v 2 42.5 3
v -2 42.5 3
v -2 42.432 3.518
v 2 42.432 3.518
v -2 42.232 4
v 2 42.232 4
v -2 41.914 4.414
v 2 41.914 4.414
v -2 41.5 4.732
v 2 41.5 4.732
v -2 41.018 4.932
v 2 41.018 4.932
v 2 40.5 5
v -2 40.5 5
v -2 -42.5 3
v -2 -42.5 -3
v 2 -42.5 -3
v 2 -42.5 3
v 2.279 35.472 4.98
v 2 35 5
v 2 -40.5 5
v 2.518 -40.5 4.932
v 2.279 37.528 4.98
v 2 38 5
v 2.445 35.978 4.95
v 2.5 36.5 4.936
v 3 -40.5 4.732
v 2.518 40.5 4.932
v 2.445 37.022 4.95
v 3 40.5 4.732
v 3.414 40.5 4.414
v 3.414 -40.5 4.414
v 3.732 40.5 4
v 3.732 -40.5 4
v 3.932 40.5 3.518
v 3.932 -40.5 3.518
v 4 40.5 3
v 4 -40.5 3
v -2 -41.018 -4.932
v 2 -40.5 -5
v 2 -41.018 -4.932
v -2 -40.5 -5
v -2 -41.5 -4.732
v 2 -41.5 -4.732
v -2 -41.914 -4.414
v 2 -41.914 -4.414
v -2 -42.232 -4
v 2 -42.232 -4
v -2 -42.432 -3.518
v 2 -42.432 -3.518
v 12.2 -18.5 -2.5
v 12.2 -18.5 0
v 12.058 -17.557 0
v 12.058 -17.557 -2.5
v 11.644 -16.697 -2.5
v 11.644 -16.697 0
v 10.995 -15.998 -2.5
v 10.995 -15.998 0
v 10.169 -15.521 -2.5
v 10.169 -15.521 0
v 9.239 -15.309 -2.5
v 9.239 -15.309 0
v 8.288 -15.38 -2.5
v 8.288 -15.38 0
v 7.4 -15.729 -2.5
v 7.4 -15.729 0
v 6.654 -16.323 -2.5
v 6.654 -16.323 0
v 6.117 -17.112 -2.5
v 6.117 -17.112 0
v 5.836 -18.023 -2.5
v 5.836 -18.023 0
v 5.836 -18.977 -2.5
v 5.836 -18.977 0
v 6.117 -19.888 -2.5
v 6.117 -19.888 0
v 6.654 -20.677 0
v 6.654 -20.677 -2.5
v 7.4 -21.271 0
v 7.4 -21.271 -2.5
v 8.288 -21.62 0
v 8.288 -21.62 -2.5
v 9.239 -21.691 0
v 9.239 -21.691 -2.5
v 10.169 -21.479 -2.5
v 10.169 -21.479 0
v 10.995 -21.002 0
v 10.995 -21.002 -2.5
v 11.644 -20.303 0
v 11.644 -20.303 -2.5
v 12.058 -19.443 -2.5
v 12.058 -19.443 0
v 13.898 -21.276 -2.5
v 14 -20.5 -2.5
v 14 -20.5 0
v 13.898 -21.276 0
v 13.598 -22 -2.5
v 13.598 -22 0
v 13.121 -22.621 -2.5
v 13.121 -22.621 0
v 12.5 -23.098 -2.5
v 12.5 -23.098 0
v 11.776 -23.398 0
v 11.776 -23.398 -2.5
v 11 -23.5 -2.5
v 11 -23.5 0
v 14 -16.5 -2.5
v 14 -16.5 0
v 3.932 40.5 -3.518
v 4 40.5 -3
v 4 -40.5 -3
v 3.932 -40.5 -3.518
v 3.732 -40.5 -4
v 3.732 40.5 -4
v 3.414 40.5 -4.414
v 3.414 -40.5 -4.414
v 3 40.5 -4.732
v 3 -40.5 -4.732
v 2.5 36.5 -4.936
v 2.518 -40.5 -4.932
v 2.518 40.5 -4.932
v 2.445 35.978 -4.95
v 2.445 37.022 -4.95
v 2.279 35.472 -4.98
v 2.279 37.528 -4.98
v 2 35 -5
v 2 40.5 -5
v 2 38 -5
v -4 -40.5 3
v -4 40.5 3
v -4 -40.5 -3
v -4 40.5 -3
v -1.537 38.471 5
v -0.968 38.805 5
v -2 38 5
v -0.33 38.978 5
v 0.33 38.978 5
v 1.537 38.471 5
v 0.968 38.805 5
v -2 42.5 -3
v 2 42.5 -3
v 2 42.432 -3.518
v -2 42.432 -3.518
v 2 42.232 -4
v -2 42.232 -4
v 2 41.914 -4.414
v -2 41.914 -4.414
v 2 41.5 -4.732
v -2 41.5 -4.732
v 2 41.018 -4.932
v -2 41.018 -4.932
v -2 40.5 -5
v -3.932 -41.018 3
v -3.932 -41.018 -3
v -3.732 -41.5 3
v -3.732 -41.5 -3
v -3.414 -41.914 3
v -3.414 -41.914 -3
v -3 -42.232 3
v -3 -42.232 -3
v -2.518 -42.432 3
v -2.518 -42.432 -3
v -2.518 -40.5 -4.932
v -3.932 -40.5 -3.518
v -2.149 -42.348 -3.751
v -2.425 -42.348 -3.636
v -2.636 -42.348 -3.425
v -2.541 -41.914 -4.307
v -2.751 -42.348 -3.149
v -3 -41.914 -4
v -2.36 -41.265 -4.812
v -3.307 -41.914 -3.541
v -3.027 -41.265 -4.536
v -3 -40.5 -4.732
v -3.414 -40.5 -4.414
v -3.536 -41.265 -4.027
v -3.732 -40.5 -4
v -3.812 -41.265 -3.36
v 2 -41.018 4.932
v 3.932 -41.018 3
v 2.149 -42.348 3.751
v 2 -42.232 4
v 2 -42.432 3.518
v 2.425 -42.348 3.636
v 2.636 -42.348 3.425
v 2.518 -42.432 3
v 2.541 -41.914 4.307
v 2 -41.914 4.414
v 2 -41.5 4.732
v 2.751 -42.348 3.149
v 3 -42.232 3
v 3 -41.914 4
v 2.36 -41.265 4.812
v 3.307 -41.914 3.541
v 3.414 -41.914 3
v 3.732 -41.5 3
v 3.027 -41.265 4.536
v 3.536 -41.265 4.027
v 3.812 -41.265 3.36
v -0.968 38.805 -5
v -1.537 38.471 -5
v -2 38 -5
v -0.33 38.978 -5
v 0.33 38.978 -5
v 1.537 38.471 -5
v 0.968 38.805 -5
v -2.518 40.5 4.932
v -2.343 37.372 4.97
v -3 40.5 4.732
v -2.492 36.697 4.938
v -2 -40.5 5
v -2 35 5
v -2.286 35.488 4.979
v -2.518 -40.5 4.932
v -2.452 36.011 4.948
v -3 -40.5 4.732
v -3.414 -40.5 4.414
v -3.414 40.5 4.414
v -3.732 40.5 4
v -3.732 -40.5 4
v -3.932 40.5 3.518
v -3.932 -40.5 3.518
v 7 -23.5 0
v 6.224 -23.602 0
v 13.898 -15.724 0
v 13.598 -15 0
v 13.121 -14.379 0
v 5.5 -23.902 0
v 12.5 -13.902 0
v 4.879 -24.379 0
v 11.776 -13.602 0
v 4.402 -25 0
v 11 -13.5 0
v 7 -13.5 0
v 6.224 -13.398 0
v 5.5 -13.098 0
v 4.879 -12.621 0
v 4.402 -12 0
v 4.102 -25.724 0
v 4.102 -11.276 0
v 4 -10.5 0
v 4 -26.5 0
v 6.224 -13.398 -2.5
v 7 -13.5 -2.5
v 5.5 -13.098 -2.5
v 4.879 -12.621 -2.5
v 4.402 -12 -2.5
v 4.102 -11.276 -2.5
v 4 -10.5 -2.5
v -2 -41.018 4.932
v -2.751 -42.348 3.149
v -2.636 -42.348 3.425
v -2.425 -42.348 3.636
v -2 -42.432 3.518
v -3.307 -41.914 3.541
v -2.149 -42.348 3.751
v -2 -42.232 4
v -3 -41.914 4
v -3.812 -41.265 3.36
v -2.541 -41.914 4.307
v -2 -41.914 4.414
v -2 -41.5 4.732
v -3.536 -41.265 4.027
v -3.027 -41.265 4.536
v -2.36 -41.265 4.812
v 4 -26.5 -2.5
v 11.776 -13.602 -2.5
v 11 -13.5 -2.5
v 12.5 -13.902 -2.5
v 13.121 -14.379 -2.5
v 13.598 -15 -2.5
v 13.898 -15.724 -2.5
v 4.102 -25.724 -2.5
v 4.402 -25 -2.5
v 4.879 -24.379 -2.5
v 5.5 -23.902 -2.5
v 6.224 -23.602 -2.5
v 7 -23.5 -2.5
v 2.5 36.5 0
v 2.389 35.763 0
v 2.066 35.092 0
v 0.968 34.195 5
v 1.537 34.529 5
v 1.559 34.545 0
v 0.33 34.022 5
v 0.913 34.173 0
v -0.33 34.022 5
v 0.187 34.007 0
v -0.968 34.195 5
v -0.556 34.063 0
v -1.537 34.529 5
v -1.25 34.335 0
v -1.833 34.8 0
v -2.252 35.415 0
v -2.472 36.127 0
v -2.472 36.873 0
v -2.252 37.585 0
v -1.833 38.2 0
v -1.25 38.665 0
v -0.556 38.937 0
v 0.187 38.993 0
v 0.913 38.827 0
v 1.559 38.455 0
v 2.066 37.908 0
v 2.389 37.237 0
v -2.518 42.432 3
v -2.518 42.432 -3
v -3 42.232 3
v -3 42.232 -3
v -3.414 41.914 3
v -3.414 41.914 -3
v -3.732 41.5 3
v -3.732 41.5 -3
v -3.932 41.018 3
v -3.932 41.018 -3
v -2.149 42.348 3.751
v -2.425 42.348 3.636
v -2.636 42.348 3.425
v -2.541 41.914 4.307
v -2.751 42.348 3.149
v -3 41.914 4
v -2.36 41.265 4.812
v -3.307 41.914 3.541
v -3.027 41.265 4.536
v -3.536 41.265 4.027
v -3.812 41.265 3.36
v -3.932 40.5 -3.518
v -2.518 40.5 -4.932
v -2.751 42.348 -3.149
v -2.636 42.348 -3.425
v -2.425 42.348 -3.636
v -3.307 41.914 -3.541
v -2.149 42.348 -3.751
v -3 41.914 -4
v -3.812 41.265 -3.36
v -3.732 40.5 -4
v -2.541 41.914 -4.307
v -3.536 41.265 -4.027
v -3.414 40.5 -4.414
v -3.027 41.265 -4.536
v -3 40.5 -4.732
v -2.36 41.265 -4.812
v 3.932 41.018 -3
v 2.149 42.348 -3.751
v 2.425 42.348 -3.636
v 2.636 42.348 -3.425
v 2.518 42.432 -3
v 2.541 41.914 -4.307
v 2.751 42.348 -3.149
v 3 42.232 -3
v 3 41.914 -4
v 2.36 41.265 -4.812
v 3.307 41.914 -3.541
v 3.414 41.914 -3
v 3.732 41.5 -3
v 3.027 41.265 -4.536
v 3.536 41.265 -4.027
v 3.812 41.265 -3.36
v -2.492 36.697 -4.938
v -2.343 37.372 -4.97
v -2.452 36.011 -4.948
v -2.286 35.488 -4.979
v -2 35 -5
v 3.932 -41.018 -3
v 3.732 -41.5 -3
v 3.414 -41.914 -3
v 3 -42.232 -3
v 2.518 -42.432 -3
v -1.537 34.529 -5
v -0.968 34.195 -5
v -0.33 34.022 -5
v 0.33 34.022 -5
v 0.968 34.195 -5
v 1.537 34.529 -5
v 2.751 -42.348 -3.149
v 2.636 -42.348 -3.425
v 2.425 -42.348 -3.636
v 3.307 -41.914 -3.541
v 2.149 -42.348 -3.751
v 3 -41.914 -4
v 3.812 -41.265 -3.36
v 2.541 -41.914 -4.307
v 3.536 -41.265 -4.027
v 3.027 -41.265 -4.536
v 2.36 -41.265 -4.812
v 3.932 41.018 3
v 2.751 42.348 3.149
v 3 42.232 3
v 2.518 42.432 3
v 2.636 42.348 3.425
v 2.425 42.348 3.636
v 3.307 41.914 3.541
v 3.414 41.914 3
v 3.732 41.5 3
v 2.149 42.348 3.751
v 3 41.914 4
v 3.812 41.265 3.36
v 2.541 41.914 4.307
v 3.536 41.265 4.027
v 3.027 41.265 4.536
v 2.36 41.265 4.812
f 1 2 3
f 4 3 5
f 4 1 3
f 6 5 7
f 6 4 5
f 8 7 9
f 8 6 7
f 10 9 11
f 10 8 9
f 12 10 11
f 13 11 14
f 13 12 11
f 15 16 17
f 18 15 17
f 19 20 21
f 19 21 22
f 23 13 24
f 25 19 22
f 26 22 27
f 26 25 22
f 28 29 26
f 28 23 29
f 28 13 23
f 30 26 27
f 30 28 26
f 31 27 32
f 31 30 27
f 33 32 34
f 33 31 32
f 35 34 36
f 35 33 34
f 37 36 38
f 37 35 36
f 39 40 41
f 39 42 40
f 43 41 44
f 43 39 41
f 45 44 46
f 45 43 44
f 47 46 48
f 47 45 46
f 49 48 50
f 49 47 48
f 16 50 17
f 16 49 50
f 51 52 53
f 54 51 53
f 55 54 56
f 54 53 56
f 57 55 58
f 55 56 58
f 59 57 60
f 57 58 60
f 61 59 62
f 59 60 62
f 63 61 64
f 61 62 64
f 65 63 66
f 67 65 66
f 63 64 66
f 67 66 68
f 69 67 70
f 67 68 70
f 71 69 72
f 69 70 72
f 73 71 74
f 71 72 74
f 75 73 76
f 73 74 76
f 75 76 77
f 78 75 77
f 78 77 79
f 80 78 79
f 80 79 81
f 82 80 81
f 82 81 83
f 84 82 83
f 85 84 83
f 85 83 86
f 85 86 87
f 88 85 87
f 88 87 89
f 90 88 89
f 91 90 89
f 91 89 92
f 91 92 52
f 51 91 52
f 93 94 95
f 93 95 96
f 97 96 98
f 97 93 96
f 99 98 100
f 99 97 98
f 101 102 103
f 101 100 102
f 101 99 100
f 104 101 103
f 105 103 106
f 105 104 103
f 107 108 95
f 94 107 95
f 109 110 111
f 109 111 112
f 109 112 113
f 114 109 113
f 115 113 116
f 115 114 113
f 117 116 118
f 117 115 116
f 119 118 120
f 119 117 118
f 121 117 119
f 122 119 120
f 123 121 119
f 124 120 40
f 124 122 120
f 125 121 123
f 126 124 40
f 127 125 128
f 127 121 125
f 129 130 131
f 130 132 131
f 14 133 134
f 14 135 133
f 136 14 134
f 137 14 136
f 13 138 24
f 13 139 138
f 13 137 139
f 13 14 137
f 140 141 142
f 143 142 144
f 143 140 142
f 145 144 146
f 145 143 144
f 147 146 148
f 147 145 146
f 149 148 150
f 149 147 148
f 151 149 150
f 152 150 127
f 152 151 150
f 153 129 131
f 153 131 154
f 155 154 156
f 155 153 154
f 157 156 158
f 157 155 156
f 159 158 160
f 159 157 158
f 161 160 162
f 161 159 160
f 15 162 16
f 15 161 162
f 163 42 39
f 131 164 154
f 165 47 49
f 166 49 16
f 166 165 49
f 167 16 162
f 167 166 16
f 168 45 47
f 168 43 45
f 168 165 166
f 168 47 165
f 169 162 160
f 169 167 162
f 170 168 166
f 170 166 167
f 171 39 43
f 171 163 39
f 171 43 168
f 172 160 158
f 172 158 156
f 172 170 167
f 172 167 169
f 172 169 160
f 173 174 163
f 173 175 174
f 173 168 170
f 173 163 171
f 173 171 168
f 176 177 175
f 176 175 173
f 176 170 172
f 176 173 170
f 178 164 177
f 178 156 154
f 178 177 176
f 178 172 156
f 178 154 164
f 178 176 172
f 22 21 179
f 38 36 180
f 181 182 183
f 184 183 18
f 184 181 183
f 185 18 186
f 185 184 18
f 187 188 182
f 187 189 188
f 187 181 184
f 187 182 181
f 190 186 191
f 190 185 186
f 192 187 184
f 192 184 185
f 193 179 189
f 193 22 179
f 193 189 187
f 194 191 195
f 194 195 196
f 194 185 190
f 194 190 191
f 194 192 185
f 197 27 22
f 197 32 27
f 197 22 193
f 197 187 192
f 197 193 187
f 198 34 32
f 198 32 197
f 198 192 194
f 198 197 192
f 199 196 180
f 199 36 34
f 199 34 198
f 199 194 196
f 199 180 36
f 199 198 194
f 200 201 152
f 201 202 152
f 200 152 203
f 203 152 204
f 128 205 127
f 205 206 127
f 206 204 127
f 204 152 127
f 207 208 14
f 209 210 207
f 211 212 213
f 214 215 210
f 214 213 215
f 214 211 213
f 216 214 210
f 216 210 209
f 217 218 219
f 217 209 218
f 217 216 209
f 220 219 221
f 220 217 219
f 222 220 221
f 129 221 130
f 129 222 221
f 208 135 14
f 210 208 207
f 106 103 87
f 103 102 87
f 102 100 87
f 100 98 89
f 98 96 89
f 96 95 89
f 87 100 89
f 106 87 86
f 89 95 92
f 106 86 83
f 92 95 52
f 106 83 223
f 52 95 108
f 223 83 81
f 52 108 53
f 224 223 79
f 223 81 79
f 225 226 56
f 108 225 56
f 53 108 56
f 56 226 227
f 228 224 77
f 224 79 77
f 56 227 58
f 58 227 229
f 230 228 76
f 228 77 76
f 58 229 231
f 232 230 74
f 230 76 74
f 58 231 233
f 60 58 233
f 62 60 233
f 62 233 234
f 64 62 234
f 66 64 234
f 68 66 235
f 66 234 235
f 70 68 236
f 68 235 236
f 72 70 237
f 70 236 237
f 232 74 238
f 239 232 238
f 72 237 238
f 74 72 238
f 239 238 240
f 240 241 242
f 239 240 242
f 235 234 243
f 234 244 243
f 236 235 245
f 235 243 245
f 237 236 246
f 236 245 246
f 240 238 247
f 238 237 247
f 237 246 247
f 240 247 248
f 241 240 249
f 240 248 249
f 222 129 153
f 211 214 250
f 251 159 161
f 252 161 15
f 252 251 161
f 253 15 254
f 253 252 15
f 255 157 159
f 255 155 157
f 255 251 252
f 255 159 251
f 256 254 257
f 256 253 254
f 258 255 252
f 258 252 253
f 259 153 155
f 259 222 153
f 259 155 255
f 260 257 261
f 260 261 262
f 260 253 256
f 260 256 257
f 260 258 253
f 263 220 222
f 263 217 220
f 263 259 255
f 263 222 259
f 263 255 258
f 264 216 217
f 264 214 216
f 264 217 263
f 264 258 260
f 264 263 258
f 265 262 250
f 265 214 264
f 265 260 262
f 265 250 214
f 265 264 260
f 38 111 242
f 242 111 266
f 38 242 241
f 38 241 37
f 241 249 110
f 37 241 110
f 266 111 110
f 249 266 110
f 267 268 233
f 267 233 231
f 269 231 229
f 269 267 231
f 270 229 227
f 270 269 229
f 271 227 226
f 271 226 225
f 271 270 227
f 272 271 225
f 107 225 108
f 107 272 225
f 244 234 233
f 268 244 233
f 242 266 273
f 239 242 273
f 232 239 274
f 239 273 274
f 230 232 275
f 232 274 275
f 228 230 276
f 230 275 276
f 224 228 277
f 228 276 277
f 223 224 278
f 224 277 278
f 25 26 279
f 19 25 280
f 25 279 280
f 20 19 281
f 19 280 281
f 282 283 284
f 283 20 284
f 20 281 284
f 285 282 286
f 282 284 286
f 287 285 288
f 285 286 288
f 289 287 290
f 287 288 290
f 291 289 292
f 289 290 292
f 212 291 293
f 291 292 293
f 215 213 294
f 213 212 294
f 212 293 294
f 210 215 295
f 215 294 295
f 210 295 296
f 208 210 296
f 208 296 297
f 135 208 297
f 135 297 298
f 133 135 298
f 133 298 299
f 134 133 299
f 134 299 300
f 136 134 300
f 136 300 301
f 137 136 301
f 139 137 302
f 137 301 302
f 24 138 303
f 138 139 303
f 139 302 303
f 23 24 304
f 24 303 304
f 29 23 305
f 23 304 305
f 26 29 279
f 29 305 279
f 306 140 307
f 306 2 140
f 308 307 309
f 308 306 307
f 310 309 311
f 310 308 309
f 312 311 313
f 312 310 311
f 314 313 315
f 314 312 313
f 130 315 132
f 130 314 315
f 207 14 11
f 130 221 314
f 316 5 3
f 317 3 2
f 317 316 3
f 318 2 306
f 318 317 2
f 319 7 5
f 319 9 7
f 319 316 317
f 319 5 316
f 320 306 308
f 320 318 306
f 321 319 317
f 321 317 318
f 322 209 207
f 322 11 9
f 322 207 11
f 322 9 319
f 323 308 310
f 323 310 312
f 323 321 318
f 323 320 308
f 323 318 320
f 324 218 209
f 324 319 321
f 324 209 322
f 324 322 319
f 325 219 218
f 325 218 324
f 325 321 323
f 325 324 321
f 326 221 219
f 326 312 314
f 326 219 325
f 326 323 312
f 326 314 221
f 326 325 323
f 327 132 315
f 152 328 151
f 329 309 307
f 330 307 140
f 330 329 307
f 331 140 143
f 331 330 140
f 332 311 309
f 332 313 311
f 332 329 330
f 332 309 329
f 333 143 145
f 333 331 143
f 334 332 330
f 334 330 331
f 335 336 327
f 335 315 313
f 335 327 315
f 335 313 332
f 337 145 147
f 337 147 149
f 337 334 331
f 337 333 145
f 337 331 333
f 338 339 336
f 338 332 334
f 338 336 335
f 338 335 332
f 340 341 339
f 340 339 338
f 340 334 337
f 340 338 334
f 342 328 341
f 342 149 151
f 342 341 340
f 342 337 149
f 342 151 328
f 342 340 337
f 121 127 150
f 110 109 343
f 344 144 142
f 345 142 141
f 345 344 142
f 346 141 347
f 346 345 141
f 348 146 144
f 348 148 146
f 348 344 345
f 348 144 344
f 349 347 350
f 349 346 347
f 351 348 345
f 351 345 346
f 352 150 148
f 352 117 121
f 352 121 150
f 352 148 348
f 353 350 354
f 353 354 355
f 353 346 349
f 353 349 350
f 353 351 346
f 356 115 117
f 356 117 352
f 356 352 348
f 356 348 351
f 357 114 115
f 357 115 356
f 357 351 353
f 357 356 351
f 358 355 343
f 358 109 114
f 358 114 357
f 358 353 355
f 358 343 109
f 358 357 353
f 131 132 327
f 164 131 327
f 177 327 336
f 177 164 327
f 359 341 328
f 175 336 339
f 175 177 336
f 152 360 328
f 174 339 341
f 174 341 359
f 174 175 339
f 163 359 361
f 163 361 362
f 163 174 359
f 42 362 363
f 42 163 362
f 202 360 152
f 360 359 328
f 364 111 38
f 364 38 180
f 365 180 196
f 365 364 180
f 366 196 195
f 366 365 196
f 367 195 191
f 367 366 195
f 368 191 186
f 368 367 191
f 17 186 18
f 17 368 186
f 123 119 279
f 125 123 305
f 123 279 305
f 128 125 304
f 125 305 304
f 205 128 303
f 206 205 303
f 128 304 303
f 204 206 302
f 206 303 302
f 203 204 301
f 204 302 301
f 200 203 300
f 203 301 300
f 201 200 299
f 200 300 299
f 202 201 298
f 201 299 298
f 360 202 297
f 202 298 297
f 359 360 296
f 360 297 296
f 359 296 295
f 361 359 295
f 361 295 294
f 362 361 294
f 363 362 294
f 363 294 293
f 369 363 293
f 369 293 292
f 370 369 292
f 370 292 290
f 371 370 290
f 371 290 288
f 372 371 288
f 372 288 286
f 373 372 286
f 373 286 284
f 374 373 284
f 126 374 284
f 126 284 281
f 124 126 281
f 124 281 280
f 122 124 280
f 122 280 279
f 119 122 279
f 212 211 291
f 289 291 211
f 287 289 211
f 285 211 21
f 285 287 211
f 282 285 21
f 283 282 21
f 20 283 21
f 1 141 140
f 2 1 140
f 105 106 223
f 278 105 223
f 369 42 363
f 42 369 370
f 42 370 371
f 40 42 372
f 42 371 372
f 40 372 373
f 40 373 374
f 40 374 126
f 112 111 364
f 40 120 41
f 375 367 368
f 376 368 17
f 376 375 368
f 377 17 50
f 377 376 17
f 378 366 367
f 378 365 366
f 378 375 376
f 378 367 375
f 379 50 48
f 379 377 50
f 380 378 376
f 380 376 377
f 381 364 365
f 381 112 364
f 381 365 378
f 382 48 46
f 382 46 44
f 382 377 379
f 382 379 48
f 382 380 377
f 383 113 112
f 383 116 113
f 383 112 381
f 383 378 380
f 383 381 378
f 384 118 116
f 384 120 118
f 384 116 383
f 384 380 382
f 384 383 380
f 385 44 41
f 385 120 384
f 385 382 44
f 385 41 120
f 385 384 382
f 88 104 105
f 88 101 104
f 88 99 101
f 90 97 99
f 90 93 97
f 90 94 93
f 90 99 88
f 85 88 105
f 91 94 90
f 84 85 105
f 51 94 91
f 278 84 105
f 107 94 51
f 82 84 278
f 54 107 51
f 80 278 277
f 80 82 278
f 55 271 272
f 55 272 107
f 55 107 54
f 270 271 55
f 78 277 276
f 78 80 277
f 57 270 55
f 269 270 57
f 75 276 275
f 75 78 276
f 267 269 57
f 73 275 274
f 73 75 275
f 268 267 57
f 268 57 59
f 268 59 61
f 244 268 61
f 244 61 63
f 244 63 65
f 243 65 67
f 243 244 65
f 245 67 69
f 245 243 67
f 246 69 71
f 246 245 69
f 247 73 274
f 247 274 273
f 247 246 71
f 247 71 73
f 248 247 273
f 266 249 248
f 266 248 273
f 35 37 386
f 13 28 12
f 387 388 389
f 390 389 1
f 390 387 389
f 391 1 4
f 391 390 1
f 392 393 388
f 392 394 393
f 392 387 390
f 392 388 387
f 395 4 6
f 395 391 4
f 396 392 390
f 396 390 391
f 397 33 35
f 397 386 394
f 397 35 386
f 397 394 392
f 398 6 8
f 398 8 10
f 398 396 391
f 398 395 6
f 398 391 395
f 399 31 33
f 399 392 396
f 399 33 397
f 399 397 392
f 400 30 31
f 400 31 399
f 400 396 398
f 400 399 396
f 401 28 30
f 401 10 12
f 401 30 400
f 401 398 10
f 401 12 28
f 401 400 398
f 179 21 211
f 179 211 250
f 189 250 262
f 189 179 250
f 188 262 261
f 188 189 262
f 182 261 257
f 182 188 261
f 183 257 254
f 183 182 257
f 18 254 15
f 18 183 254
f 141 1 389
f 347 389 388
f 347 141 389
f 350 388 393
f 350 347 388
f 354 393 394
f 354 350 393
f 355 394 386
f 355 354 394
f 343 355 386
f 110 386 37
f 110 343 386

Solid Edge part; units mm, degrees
sketch "Sketch1" plane through (0, 0, 0) normal (0, 0, 1) x (1, 0, 0)
  line L0 (-4, 42.5) -> (-4, -42.5)
  line L1 (-4, -42.5) -> (4, -42.5)
  line L2 (4, -42.5) -> (4, 42.5)
  line L3 (4, 42.5) -> (-4, 42.5)
extrude "Protrusion1" add sketch "Sketch1" along normal mid plane 10
fillet "Round_2" radius 2 4 edges at (-4, 0, 5) (4, 0, 5) (-4, 0, -5) (4, 0, -5)
fillet "Round_3" radius 2 14 edges at (-3.4142, 42.5, 4.4142) (0, 42.5, 5) (3.4142, 42.5, 4.4142) (4, 42.5, 0) (0, 42.5, -5) (-3.4142, 42.5, -4.4142) (-4, 42.5, 0) (0, -42.5, 5) (-3.4142, -42.5, 4.4142) (-4, -42.5, 0) (-3.4142, -42.5, -4.4142) (0, -42.5, -5) (3.4142, -42.5, -4.4142) (4, -42.5, 0)
sketch "Sketch2" plane through (0, 0, 0) normal (0, 0, 1) x (1, 0, 0)
  circle A0 centre (9, -18.5) radius 3.2
  line L0 (14, -13.5) -> (14, -23.5)
  line L1 (14, -23.5) -> (4, -23.5)
  line L2 (4, -23.5) -> (4, -13.5)
  line L3 (4, -13.5) -> (14, -13.5)
  dimension "D1" = 55
  dimension "D2" = 6.4
  dimension "D3" = 5
  dimension "D4" = 10
  dimension "D5" = 10
  dimension "D6" = 5
extrude "ExtrudedProtrusion_4" add sketch "Sketch2" against normal blind 2.5
fillet "Round_5" radius 3 4 edges at (14, -13.5, -1.25) (14, -23.5, -1.25) (4, -13.5, -1.25) (4, -23.5, -1.25)
sketch "Sketch3" plane through (0, 0, 0) normal (0, 0, 1) x (1, 0, 0)
  circle A0 centre (0, 36.5) radius 2.5
extrude "ExtrudedCutout_2" cut sketch "Sketch3" along normal mid plane 10
